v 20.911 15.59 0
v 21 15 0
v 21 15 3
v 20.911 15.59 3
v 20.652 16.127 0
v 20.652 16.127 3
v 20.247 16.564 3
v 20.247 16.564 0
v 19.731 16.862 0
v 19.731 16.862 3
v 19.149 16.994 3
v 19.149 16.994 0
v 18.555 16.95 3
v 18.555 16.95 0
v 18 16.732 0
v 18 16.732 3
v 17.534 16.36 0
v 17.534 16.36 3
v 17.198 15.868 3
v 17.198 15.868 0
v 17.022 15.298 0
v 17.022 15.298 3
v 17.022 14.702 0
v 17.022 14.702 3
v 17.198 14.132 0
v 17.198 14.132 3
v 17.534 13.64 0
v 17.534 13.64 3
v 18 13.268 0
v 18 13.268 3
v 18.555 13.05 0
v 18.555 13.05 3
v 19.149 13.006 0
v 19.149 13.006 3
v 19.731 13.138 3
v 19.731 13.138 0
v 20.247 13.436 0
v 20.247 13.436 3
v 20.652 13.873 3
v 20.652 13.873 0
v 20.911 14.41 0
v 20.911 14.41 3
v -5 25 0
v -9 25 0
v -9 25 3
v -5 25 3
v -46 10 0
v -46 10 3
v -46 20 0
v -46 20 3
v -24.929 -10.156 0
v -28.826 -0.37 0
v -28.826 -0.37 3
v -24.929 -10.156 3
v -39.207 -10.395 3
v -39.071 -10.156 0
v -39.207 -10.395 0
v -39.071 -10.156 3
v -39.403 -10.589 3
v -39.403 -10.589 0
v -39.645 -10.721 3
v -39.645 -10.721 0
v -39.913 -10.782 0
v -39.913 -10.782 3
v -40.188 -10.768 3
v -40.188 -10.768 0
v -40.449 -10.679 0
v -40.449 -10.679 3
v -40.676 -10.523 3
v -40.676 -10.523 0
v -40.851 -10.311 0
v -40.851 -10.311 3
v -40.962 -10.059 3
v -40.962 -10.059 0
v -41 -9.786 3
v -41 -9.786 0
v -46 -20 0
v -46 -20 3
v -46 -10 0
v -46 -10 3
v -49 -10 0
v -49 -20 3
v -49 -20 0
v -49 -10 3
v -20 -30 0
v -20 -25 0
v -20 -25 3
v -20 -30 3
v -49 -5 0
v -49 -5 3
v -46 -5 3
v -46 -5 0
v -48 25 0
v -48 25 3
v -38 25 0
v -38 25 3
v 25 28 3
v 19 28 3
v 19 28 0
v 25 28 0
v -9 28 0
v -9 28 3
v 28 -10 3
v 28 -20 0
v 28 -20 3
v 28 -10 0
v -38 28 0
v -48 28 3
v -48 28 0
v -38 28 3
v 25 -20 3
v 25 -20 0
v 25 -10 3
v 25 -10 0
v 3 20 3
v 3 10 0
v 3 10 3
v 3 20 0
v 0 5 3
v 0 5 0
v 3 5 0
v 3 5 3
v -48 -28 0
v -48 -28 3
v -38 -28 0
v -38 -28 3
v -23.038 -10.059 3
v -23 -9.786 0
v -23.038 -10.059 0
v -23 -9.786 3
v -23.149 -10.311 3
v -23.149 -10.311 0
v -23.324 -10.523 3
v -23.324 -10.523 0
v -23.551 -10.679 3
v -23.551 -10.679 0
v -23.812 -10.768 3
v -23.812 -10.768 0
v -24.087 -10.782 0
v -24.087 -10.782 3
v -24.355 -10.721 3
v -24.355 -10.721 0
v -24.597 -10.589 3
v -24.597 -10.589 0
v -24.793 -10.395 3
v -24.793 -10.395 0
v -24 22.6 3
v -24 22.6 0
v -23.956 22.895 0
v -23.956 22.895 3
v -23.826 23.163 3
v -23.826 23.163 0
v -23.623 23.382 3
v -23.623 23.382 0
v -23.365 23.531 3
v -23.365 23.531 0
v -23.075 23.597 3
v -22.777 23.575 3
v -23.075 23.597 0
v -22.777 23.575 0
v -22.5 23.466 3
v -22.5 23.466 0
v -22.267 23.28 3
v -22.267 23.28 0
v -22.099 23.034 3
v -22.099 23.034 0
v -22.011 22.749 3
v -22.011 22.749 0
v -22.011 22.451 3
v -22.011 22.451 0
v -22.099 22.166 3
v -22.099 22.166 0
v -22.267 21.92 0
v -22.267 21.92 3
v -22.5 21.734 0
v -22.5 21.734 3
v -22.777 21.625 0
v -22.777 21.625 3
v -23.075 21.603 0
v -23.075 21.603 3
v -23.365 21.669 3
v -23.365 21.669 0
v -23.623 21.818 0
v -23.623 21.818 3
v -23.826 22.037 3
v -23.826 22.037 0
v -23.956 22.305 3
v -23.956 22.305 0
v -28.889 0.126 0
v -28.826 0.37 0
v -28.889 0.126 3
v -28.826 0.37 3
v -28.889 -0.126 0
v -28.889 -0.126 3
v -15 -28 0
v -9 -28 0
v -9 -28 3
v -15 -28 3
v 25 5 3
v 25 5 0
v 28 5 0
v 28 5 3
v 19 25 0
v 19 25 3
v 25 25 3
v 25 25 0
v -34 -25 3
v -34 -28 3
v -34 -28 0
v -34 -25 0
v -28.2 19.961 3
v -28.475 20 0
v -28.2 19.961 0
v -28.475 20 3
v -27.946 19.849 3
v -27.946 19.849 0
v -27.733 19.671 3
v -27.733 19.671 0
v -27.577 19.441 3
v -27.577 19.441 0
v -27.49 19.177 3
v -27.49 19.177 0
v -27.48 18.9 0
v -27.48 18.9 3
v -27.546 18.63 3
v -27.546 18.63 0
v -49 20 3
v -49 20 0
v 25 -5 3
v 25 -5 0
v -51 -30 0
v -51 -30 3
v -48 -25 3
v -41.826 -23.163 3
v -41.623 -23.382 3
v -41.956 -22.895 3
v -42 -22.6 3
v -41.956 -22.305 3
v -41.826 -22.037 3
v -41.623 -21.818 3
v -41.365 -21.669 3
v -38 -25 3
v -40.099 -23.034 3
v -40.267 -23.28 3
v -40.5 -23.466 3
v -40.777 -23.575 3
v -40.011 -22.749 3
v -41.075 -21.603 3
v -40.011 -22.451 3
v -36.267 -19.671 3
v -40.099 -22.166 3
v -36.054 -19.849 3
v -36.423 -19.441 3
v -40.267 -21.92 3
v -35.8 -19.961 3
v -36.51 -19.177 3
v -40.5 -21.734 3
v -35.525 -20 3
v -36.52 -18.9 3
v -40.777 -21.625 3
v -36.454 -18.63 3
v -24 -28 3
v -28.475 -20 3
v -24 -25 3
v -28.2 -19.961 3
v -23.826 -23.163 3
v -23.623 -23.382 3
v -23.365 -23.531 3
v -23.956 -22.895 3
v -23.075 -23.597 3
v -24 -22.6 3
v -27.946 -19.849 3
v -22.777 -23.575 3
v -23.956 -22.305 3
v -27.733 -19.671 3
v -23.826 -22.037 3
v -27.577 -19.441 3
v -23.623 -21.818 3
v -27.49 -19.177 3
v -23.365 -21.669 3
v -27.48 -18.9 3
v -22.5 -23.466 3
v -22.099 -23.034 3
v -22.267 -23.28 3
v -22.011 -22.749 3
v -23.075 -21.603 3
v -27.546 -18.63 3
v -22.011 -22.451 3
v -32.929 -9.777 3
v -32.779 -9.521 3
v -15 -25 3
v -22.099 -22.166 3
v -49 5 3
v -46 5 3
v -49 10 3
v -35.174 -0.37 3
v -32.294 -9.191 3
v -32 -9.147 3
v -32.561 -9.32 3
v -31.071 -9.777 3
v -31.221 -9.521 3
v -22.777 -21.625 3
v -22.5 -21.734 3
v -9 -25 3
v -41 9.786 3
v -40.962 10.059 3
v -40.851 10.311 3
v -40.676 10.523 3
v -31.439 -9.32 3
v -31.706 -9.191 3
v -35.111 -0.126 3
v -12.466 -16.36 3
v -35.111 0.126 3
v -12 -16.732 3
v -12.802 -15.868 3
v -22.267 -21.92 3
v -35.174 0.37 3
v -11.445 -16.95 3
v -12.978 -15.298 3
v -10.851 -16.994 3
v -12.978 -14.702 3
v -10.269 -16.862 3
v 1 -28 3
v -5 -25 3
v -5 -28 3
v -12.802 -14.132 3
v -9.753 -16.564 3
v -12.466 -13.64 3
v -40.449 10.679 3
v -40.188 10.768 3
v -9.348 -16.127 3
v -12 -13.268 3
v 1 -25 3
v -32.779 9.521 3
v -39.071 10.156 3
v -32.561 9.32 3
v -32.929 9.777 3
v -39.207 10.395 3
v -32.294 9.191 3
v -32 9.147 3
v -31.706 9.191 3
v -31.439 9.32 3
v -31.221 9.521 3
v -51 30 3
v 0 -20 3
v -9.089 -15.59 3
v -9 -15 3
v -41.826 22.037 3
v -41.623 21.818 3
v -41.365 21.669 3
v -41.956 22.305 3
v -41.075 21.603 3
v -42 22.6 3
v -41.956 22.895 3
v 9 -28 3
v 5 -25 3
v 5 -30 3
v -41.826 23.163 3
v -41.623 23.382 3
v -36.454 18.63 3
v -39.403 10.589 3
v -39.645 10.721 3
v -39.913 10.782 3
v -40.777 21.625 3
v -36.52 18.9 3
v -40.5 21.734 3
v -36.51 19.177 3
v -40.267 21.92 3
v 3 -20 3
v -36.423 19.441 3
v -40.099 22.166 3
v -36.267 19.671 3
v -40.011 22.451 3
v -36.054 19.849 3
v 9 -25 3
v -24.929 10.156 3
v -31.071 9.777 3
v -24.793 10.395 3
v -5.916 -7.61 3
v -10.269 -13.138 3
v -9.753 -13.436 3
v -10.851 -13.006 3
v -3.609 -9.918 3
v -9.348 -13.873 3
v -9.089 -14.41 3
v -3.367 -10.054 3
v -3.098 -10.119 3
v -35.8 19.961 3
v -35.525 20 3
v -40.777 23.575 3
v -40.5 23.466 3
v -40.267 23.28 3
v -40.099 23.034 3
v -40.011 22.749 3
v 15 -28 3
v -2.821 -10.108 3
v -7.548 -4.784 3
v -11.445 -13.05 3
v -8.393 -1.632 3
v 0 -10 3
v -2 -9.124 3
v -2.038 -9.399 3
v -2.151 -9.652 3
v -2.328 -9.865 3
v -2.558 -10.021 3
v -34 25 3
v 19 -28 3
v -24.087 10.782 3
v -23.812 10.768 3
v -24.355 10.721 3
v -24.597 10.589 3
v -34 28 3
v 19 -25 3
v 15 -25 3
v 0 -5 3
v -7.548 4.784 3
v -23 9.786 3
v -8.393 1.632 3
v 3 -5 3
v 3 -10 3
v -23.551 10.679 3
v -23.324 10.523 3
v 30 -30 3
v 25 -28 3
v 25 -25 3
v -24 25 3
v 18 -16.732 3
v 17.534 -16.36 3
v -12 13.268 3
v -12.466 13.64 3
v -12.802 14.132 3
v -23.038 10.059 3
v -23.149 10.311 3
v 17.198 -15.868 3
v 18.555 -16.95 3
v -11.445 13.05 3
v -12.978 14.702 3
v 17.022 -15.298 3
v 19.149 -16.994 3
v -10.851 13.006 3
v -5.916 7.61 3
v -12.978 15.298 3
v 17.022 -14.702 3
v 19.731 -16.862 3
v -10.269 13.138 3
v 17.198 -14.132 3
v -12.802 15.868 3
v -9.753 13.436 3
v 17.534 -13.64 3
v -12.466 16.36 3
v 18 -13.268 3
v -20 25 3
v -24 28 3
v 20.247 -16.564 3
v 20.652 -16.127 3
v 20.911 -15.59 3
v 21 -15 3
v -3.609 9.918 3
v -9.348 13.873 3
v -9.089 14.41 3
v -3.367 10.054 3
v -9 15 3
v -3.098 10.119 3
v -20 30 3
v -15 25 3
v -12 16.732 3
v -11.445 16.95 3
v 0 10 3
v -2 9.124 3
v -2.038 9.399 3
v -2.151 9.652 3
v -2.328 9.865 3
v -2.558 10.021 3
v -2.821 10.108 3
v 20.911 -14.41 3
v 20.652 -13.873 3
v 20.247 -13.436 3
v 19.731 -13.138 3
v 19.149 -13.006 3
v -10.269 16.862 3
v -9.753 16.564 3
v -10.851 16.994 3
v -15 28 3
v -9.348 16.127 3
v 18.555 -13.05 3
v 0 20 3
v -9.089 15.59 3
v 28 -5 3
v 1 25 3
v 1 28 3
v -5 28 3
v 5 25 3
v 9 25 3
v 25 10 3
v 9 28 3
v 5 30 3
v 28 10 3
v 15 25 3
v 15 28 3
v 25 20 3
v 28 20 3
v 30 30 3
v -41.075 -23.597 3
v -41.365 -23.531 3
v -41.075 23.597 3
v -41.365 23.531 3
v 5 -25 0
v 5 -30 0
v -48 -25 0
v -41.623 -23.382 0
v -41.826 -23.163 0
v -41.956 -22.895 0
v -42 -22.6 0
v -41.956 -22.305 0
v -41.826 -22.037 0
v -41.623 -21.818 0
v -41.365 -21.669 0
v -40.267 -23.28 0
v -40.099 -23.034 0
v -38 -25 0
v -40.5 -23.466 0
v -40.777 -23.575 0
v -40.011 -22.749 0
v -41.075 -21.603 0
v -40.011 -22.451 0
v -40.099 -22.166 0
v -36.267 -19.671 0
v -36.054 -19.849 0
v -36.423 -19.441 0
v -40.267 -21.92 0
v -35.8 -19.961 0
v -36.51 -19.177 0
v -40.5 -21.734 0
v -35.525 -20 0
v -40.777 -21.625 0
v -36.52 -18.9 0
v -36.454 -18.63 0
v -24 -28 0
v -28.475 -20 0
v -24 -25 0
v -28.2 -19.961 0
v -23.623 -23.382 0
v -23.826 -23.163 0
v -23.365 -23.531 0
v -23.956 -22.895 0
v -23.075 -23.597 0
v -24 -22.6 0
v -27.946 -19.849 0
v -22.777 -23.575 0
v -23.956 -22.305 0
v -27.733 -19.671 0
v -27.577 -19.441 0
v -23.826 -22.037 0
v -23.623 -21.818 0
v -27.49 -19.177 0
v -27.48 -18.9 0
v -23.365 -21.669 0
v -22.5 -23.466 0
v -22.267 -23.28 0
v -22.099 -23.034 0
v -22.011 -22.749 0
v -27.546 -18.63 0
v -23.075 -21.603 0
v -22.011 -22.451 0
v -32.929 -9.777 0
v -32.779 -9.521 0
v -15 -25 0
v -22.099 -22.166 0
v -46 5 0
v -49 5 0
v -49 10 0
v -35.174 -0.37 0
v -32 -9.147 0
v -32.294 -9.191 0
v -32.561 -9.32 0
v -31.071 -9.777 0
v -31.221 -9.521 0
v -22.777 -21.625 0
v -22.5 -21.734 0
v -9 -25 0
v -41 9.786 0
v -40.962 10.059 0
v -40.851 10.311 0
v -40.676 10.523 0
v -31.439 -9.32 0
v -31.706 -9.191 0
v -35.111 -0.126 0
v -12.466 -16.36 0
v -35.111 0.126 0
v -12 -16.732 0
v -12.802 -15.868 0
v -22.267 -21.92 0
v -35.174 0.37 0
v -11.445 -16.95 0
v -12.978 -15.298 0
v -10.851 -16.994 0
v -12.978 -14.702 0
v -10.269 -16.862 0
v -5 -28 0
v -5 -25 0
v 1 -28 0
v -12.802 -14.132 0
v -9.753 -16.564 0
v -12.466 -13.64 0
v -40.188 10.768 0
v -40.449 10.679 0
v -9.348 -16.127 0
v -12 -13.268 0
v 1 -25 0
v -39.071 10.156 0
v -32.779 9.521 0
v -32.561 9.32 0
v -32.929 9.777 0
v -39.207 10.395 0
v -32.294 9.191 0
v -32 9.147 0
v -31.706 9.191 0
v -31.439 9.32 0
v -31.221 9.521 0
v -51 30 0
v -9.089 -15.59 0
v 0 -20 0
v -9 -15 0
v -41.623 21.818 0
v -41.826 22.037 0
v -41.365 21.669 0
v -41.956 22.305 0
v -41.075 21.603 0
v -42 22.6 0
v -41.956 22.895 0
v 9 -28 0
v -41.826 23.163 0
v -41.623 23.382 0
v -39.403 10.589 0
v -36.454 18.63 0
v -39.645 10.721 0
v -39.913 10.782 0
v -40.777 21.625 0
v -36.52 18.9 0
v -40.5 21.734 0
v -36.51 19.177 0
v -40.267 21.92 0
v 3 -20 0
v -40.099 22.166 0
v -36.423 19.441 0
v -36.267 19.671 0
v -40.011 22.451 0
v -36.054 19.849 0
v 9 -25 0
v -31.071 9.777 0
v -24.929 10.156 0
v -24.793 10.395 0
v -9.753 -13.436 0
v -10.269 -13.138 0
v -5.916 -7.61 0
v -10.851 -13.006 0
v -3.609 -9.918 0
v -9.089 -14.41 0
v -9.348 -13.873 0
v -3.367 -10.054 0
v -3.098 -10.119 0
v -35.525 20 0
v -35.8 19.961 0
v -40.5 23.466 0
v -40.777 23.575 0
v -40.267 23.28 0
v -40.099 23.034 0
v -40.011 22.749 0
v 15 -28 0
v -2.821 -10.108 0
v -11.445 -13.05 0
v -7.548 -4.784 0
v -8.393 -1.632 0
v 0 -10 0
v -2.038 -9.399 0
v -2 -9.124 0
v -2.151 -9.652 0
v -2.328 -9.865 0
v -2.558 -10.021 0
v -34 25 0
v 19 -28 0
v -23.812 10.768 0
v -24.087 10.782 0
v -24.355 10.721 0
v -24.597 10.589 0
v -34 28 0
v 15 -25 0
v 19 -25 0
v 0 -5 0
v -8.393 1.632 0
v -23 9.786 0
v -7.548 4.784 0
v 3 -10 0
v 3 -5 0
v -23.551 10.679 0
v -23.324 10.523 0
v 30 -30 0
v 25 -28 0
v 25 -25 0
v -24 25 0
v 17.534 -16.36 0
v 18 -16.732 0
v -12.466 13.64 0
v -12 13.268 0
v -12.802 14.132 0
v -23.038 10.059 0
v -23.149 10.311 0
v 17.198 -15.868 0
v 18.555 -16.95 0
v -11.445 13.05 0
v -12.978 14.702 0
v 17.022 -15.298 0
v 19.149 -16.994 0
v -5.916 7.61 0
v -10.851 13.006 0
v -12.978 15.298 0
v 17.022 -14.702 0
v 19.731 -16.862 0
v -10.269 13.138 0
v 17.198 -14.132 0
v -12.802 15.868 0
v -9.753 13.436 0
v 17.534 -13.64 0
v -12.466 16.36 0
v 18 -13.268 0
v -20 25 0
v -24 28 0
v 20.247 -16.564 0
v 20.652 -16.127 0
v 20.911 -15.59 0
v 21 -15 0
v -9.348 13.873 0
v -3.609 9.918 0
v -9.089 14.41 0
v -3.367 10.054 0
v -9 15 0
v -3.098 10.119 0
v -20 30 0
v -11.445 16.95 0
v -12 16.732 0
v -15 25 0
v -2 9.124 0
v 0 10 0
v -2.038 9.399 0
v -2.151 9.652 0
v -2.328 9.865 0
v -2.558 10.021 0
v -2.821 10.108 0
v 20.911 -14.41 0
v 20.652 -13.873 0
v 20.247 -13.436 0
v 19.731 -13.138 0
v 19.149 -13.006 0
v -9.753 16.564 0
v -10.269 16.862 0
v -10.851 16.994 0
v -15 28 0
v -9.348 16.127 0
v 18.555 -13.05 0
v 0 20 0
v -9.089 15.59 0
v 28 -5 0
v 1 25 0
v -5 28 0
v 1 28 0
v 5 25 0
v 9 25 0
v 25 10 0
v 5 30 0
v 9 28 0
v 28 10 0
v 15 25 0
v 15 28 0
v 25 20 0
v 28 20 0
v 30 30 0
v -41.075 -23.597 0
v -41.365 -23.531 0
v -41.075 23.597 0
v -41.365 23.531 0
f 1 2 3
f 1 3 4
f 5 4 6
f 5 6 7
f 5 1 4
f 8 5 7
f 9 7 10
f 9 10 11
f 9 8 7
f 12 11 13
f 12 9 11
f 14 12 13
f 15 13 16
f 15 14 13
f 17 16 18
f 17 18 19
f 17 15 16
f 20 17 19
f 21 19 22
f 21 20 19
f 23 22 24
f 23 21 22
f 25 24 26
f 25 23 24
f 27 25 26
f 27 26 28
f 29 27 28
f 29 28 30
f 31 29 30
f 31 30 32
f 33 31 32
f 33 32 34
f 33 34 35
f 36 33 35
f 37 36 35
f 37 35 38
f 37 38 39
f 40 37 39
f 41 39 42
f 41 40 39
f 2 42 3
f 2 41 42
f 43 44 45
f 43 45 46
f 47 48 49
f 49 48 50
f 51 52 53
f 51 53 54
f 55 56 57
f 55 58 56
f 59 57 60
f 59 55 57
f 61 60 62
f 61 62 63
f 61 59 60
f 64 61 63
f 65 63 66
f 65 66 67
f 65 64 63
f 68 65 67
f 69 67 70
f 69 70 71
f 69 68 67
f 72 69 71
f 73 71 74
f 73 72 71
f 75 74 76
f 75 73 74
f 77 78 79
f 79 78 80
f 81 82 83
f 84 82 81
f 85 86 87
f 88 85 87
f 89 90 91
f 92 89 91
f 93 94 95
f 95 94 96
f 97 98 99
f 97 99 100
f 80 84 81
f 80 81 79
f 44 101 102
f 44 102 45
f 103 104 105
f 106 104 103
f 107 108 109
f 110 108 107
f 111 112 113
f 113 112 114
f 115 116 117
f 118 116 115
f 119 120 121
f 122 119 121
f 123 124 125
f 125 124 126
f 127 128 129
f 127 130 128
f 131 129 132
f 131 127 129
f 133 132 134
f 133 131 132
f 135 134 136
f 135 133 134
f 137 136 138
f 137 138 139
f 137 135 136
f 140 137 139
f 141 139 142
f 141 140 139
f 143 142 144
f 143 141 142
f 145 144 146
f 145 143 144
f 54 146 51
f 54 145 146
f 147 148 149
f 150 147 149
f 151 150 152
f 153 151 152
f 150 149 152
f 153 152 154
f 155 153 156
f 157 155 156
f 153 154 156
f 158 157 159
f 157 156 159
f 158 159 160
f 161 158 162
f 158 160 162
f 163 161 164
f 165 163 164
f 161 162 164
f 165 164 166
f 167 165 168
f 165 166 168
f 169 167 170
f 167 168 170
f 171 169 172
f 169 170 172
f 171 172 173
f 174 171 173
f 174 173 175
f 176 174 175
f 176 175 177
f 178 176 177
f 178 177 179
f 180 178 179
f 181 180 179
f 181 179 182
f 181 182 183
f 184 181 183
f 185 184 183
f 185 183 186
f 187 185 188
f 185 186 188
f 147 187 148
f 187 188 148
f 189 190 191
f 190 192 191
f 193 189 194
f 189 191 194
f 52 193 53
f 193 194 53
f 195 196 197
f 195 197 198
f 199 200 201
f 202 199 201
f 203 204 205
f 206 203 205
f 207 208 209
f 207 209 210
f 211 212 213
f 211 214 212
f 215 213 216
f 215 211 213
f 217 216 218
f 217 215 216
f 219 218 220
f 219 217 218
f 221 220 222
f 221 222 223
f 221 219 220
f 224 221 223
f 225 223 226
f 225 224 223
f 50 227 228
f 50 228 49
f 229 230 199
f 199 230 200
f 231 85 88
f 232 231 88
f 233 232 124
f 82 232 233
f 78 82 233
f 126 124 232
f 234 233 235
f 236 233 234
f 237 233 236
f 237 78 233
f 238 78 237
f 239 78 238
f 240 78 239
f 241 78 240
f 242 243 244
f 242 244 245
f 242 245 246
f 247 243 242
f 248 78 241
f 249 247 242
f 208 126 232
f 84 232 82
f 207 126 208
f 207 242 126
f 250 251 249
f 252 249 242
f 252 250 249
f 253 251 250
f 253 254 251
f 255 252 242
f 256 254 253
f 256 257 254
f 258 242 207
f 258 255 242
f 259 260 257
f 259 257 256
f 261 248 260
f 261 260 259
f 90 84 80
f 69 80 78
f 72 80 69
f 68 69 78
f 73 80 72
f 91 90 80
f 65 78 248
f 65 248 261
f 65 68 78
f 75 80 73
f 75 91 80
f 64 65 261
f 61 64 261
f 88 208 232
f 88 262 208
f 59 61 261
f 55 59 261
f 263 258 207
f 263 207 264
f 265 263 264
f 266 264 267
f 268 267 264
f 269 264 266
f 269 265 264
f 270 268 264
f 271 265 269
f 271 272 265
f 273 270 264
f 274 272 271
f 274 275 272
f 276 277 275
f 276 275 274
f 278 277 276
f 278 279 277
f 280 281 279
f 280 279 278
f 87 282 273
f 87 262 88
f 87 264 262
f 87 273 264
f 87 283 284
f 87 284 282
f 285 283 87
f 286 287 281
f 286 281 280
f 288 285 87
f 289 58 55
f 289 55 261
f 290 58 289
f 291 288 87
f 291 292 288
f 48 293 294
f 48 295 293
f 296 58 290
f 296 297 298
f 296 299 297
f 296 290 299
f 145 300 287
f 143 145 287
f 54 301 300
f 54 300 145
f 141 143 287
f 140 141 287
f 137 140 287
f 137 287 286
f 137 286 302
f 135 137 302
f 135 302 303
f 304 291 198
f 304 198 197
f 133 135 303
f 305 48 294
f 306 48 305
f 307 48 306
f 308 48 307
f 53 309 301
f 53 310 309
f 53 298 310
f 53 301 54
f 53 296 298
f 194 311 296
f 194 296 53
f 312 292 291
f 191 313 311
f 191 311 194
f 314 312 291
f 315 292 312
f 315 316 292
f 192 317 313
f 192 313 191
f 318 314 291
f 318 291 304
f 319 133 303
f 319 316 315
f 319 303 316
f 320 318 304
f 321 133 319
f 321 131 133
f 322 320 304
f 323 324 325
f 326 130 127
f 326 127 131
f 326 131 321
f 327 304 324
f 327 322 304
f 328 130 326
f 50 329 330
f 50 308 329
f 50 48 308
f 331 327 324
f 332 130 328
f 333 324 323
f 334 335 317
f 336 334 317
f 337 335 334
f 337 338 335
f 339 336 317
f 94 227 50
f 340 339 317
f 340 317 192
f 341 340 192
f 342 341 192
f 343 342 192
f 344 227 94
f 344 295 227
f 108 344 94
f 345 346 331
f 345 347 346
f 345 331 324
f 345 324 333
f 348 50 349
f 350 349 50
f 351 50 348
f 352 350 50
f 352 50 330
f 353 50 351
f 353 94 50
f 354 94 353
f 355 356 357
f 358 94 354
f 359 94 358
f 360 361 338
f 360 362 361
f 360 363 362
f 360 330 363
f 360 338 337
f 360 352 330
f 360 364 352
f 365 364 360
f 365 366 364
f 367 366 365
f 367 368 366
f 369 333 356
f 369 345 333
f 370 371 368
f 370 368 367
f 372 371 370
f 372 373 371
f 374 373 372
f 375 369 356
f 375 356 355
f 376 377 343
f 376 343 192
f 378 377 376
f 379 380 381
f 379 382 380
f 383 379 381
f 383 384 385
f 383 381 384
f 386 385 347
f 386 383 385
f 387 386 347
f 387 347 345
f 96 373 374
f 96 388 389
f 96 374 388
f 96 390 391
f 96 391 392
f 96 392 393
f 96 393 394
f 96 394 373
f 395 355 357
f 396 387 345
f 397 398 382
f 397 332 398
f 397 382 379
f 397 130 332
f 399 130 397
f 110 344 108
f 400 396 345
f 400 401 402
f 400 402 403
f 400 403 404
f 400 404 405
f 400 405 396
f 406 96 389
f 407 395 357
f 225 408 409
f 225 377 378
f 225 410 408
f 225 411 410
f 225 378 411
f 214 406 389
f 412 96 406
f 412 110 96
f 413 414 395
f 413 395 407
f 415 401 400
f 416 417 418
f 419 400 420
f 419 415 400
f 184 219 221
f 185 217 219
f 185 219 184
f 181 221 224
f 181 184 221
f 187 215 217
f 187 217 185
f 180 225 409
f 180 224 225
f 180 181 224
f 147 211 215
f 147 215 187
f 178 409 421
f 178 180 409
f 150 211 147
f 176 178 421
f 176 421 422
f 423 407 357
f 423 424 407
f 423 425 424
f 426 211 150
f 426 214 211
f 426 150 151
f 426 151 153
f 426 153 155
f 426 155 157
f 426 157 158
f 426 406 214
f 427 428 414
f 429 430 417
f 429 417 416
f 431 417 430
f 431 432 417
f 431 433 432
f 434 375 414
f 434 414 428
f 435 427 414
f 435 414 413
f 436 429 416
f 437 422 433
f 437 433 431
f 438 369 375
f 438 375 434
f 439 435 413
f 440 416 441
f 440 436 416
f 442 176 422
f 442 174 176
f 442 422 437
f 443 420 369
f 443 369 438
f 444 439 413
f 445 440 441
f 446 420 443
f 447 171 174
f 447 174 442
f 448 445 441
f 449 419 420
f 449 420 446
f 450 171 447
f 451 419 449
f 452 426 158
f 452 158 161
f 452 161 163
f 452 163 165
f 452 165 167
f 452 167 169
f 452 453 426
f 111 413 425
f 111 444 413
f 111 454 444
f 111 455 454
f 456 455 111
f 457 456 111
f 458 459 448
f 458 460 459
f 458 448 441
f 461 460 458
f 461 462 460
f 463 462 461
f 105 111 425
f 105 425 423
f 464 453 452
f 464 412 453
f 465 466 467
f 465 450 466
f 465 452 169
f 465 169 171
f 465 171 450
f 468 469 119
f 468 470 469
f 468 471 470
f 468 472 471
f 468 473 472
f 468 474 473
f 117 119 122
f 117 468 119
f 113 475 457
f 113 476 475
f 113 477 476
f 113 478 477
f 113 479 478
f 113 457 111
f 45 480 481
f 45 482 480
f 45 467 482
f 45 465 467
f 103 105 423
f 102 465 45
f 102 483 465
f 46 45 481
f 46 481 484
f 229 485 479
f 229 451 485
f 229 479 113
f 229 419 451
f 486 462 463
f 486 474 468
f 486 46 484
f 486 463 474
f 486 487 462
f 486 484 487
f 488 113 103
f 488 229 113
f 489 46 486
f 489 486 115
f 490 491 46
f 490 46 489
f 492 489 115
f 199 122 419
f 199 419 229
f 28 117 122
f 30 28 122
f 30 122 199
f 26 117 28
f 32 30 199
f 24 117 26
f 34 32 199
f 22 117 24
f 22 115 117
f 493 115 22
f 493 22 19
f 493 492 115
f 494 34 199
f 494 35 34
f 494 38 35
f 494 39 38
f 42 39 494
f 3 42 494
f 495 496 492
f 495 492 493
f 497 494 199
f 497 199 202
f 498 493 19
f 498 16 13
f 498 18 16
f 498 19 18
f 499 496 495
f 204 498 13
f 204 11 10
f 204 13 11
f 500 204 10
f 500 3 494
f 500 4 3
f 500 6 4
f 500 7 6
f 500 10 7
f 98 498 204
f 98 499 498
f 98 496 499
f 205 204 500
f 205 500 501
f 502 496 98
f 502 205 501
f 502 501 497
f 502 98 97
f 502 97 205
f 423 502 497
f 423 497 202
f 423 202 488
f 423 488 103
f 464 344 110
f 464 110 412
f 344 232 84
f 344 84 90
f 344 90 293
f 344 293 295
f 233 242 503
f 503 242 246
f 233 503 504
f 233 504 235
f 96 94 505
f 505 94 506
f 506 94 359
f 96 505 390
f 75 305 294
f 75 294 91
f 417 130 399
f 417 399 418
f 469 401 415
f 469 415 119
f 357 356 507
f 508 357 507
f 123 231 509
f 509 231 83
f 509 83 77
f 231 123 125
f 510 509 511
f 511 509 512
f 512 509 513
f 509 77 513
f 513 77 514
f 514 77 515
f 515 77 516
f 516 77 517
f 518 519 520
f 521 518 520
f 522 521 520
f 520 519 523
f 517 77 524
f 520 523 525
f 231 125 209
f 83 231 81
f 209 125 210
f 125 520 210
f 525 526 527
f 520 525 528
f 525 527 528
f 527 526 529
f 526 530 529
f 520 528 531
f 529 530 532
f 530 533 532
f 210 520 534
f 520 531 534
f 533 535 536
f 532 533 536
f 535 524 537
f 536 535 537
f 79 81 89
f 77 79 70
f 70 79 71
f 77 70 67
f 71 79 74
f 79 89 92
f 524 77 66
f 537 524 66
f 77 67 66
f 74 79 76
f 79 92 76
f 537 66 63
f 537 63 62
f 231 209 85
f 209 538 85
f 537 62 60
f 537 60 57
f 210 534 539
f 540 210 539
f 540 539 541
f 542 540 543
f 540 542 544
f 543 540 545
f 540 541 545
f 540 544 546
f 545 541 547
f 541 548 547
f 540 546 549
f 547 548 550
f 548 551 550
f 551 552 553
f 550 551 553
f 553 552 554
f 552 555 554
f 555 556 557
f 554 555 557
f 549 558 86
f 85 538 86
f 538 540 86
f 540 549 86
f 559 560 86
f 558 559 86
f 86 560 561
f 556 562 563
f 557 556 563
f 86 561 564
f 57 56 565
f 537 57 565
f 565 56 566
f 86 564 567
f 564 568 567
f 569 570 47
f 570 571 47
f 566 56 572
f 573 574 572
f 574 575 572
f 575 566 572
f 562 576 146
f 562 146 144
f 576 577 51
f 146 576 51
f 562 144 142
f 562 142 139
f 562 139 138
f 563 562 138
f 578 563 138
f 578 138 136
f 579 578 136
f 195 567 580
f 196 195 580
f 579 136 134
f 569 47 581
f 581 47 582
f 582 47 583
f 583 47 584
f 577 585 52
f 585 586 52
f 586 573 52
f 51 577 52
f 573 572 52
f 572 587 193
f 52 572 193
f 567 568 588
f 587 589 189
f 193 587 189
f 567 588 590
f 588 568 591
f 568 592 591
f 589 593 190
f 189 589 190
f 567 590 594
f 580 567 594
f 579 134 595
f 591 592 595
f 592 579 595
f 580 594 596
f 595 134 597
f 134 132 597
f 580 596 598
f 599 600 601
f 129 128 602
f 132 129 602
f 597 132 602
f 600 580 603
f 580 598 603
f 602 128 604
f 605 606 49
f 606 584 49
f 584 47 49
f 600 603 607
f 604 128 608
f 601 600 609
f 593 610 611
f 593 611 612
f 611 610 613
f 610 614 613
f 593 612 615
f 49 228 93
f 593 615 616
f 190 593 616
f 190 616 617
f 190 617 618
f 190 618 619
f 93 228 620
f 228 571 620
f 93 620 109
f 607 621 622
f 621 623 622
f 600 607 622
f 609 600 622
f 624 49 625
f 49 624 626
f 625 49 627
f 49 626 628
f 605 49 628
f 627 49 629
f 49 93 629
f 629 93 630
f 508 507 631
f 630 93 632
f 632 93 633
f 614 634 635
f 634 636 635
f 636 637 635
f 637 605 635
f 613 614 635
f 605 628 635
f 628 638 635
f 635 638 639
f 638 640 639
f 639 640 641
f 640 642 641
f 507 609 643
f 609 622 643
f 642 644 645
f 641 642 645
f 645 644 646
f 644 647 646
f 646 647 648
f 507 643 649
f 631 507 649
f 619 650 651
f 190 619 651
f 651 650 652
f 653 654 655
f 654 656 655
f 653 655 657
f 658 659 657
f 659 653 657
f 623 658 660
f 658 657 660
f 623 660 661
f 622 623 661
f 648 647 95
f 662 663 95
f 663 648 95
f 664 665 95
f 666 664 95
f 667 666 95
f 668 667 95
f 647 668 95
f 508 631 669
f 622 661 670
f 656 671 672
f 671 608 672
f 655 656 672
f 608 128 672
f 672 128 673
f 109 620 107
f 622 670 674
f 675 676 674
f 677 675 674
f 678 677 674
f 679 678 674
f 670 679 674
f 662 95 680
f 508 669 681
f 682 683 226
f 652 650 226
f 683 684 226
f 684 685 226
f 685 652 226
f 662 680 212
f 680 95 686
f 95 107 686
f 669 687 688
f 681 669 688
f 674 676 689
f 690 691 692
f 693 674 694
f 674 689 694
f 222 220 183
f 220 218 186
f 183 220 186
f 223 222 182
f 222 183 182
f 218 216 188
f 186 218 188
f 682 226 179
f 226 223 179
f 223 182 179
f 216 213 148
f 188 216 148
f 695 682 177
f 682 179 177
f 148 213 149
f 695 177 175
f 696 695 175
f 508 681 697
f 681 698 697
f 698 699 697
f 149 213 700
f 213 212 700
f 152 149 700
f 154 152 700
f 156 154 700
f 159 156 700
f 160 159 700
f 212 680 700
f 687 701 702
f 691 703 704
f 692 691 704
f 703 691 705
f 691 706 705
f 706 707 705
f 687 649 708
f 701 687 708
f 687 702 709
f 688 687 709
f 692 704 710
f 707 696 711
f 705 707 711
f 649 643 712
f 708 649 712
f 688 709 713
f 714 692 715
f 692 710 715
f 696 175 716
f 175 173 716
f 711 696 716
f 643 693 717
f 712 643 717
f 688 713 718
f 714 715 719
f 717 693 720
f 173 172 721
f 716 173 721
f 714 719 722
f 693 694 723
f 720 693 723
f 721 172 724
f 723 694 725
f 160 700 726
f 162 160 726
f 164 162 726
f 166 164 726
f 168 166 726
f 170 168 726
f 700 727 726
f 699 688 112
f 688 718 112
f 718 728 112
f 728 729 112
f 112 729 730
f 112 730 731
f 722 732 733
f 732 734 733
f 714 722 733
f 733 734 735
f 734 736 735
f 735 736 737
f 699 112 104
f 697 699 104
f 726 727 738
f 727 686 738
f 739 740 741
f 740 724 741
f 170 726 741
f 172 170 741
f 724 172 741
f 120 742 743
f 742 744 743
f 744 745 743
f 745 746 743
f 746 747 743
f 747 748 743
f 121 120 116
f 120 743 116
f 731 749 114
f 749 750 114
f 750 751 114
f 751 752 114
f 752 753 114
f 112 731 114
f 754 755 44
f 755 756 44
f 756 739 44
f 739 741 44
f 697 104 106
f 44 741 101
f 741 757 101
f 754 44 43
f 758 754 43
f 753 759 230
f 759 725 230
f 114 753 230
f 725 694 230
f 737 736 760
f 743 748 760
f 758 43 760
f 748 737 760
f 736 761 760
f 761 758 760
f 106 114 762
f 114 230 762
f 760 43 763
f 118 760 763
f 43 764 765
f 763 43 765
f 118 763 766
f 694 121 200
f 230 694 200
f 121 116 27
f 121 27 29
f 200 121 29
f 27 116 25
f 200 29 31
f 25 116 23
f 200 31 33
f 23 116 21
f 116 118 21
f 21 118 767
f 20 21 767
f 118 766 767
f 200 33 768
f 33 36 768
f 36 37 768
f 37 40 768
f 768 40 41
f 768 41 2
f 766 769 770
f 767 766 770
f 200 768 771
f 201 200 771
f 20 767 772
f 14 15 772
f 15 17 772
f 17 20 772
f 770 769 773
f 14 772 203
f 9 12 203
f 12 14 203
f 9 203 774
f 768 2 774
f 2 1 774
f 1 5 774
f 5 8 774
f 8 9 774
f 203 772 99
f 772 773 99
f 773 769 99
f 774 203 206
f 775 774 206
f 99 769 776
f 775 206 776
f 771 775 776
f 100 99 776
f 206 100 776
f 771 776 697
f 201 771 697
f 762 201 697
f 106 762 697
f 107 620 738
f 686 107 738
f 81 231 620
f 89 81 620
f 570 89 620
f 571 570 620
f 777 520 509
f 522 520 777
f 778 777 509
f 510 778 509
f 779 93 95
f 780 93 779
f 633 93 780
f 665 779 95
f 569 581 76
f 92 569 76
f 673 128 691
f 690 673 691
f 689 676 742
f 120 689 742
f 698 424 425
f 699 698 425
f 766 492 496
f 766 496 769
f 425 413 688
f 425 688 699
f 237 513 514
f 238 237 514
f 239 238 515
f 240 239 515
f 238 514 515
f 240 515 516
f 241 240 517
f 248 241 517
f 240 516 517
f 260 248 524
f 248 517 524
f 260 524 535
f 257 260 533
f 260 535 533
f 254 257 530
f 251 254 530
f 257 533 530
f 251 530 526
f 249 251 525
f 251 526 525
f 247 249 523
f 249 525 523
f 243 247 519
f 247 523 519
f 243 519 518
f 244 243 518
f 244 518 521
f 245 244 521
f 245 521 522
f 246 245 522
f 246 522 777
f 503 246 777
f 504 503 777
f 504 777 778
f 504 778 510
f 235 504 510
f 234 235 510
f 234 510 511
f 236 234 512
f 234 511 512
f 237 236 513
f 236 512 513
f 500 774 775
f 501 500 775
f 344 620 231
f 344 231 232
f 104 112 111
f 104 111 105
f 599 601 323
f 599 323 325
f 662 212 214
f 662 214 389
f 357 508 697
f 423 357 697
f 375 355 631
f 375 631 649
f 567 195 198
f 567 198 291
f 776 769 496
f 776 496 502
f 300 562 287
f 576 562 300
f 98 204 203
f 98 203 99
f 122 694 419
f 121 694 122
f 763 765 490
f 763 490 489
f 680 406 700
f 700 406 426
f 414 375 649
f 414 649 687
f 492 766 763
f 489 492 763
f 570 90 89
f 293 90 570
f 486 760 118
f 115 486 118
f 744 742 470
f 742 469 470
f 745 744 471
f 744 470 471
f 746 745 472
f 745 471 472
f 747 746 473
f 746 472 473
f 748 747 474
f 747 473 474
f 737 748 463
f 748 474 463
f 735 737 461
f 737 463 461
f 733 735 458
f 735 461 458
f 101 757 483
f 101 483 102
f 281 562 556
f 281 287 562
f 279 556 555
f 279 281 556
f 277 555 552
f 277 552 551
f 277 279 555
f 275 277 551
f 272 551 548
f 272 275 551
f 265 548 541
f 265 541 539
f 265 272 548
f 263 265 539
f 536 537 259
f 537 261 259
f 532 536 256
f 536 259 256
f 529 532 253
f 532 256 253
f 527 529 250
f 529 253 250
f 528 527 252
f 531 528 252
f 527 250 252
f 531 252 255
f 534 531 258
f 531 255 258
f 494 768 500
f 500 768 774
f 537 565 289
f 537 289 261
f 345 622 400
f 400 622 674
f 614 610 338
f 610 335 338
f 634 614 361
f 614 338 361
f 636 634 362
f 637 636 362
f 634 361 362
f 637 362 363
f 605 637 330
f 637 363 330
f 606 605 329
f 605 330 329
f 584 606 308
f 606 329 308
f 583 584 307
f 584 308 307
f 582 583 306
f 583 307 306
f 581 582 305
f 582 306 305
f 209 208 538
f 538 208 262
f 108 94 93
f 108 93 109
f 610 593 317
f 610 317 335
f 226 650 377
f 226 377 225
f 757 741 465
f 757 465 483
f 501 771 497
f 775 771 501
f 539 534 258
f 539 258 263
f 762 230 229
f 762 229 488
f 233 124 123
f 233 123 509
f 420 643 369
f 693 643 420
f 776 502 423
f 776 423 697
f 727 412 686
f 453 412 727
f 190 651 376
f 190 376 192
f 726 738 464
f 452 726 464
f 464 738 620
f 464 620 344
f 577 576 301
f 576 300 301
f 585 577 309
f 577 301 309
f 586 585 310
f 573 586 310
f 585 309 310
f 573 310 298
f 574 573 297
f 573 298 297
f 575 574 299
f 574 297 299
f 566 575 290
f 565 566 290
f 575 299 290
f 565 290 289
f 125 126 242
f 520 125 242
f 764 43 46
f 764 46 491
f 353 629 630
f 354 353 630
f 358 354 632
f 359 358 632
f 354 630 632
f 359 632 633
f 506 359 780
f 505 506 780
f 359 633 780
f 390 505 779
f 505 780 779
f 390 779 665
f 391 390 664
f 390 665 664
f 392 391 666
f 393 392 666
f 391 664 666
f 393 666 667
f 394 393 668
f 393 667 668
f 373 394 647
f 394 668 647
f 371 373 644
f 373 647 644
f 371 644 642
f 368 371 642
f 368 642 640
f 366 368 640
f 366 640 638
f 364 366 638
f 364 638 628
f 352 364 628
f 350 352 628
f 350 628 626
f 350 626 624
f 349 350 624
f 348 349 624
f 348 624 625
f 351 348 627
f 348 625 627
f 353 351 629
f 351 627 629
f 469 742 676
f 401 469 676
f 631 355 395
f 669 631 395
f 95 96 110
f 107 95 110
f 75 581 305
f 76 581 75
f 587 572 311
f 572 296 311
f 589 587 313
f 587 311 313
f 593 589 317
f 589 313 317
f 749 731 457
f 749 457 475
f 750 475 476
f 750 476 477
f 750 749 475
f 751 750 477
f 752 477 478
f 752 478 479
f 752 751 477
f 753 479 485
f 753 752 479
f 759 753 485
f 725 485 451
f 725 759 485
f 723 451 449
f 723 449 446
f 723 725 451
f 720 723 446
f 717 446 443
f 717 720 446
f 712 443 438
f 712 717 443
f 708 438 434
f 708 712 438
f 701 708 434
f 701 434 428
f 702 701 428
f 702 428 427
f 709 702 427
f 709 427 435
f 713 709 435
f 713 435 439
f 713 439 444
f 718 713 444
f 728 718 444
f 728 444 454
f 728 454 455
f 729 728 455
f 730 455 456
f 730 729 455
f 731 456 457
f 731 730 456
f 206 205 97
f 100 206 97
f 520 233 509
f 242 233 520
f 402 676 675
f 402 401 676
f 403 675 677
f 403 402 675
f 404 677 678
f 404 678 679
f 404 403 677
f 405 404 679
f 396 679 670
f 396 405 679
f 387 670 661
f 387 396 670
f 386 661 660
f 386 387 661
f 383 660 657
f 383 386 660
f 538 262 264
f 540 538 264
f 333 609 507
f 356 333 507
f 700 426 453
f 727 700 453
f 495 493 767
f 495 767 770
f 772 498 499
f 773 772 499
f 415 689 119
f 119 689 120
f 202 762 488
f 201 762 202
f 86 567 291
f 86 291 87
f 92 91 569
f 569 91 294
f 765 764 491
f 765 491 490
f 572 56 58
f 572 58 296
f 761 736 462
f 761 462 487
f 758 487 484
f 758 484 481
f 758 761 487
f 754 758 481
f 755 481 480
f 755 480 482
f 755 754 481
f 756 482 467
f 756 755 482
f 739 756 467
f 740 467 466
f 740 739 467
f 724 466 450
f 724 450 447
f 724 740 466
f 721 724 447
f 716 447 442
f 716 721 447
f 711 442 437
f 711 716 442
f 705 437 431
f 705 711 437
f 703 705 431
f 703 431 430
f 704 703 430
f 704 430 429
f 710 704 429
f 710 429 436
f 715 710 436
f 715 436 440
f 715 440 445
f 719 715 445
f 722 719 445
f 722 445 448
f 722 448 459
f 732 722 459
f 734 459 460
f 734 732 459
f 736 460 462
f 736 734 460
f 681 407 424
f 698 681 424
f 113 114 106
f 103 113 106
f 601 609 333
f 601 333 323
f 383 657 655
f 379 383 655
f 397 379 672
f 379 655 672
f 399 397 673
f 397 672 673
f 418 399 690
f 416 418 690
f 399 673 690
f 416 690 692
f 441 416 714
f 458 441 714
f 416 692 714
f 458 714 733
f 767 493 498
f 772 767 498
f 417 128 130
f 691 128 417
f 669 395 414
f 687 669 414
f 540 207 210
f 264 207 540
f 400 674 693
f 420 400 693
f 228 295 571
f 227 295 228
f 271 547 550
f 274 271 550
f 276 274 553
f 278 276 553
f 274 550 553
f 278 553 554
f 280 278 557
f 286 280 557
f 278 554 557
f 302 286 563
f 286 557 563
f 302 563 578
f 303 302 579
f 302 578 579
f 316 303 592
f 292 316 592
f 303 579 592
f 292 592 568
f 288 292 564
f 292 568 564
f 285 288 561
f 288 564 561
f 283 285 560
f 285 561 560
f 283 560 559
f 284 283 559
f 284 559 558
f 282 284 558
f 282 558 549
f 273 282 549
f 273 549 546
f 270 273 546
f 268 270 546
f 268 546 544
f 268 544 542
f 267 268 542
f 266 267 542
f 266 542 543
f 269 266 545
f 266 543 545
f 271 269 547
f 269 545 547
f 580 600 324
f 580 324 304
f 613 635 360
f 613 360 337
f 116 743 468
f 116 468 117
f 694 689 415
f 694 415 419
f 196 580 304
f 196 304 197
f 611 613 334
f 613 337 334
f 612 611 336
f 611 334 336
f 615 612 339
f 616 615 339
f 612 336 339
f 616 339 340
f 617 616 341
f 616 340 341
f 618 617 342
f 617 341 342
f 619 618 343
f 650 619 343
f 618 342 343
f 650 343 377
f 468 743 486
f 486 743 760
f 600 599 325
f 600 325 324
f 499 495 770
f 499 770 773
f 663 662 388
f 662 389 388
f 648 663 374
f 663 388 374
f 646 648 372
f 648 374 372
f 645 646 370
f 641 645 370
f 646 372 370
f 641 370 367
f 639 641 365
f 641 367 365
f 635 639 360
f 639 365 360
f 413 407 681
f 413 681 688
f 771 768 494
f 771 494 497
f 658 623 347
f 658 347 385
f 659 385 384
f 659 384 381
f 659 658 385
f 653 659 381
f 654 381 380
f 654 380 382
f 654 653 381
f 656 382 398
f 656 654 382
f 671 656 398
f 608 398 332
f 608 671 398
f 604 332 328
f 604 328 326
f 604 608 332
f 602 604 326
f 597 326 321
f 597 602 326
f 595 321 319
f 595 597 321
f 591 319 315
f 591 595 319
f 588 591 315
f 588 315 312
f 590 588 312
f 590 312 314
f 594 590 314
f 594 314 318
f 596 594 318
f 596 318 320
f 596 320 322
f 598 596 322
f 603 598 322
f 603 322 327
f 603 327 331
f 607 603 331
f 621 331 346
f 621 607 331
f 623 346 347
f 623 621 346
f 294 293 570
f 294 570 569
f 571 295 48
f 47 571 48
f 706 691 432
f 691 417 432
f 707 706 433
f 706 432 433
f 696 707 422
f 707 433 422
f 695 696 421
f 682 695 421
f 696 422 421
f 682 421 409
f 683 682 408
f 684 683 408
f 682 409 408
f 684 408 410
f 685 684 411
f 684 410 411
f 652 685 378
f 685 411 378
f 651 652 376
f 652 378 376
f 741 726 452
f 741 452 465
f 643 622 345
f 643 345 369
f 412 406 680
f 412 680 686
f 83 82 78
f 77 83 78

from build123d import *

# Parameters (mm, degrees)
SKETCH_1_R          = 2
SKETCH_1_W          = 3
SKETCH_1_H          = 10
EXTRUDE_1_DEPTH     = 3
SKETCH_2_W          = 3
SKETCH_2_H          = 60
EXTRUDE_2_DEPTH     = 31
SKETCH_3_W          = 25
SKETCH_3_H          = 3
EXTRUDE_3_DEPTH     = 5
SKETCH_4_W          = 10
SKETCH_4_H          = 3
SKETCH_4_W_2        = 6
SKETCH_4_W_3        = 3
SKETCH_4_H_2        = 10
CUT_EXTRUDE_1_DEPTH = 3
SKETCH_5_R          = 1
CUT_EXTRUDE_2_DEPTH = 3
FILLET_1_R          = 1


with BuildPart() as part:
    # 草图1 → 凸台-拉伸1 (new body)
    with BuildSketch(Plane.XY):
        Polygon((-5, 25), (-5, 28), (1, 28), (1, 25), (5, 25), (10, 25), (20, 25), (25, 25), (30, 25), (30, -25), (25, -25), (20, -25), (10, -25), (5, -25), (1, -25), (1, -28), (-5, -28), (-5, -25), (-9, -25), (-9, -28), (-15, -28), (-15, -25), (-20, -25), (-20, 25), (-15, 25), (-15, 28), (-9, 28), (-9, 25), align=None)
        with Locations((-11, 15)):
            Circle(SKETCH_1_R, mode=Mode.SUBTRACT)
        with Locations((-11, -15)):
            Circle(SKETCH_1_R, mode=Mode.SUBTRACT)
        with Locations((19, -15)):
            Circle(SKETCH_1_R, mode=Mode.SUBTRACT)
        with Locations((19, 15)):
            Circle(SKETCH_1_R, mode=Mode.SUBTRACT)
        with Locations((26.5, 15)):
            Rectangle(SKETCH_1_W, SKETCH_1_H, mode=Mode.SUBTRACT)
        with Locations((26.5, 0)):
            Rectangle(SKETCH_1_W, SKETCH_1_H, mode=Mode.SUBTRACT)
        with Locations((26.5, -15)):
            Rectangle(SKETCH_1_W, SKETCH_1_H, mode=Mode.SUBTRACT)
        with Locations((1.5, 0)):
            Rectangle(SKETCH_1_W, SKETCH_1_H, mode=Mode.SUBTRACT)
        with Locations((1.5, -15)):
            Rectangle(SKETCH_1_W, SKETCH_1_H, mode=Mode.SUBTRACT)
        with Locations((1.5, 15)):
            Rectangle(SKETCH_1_W, SKETCH_1_H, mode=Mode.SUBTRACT)
    extrude(amount=EXTRUDE_1_DEPTH)

    # 草图2 → 凸台-拉伸2 (add)
    with BuildSketch(Plane.ZY.offset(20)):
        with Locations((1.5, 0)):
            Rectangle(SKETCH_2_W, SKETCH_2_H)
    extrude(amount=EXTRUDE_2_DEPTH)

    # 草图3 → 凸台-拉伸3 (add)
    with BuildSketch(Plane(origin=(0, 25, 0), x_dir=(1, 0, 0), z_dir=(0, 1, 0))):
        with Locations((17.5, -1.5)):
            Rectangle(SKETCH_3_W, SKETCH_3_H)
    extrude_3 = extrude(amount=EXTRUDE_3_DEPTH)

    # 镜向1: 凸台-拉伸3 across plane
    add(extrude_3.mirror(Plane.ZX))

    # 草图4 → 切除-拉伸1 (cut)
    with BuildSketch(Plane.XY.offset(3)):
        with Locations((-43, 26.5)):
            Rectangle(SKETCH_4_W, SKETCH_4_H)
        with Locations((-29, 26.5)):
            Rectangle(SKETCH_4_W, SKETCH_4_H)
        with Locations((12, 26.5)):
            Rectangle(SKETCH_4_W_2, SKETCH_4_H)
        with Locations((22, 26.5)):
            Rectangle(SKETCH_4_W_2, SKETCH_4_H)
        with Locations((22, -26.5)):
            Rectangle(SKETCH_4_W_2, SKETCH_4_H)
        with Locations((12, -26.5)):
            Rectangle(SKETCH_4_W_2, SKETCH_4_H)
        with Locations((-29, -26.5)):
            Rectangle(SKETCH_4_W, SKETCH_4_H)
        with Locations((-43, -26.5)):
            Rectangle(SKETCH_4_W, SKETCH_4_H)
        with Locations((-47.5, 0)):
            Rectangle(SKETCH_4_W_3, SKETCH_4_H_2)
        with Locations((-47.5, 15)):
            Rectangle(SKETCH_4_W_3, SKETCH_4_H_2)
        with Locations((-47.5, -15)):
            Rectangle(SKETCH_4_W_3, SKETCH_4_H_2)
    extrude(amount=-CUT_EXTRUDE_1_DEPTH, mode=Mode.SUBTRACT)

    # 草图5 → 切除-拉伸2 (cut)
    with BuildSketch(Plane(origin=(0, 0, 0), x_dir=(-1, 0, 0), z_dir=(0, 0, -1))):
        with Locations((23, 22.6)):
            Circle(SKETCH_5_R)
        with Locations((41, 22.6)):
            Circle(SKETCH_5_R)
        with Locations((41, -22.6)):
            Circle(SKETCH_5_R)
        with Locations((23, -22.6)):
            Circle(SKETCH_5_R)
        with BuildLine():
            Line((2, 7.351919832), (2, -7.055869369))
            Line((2, -7.055869369), (2, -10.9658561))
            ThreePointArc((2, -10.9658561), (8.5, 0), (2, 10.9658561))
            Line((2, 10.9658561), (2, 7.351919832))
        make_face()
        Polygon((23, -15), (23, 15), (28.973451327, 0), align=None)
        Polygon((27, -20), (32, -7.444444444), (37, -20), align=None)
        Polygon((41, -15), (35.026548673, 0), (41, 15), align=None)
        Polygon((27, 20), (37, 20), (32, 7.444444444), align=None)
    extrude(amount=-CUT_EXTRUDE_2_DEPTH, mode=Mode.SUBTRACT)

    # 圆角1
    fillet_1_edges = [part.edges().sort_by_distance(p)[0] for p in [
        (-2, 10.9658561, 1.5),
        (-2, -10.9658561, 1.5),
        (-23, 15, 1.5),
        (-28.973451327, 0, 1.5),
        (-23, -15, 1.5),
        (-37, 20, 1.5),
        (-32, 7.444444444, 1.5),
        (-27, 20, 1.5),
        (-41, 15, 1.5),
        (-41, -15, 1.5),
        (-35.026548673, 0, 1.5),
        (-37, -20, 1.5),
        (-27, -20, 1.5),
        (-32, -7.444444444, 1.5),
    ]]
    fillet(fillet_1_edges, radius=FILLET_1_R)


solid = part.part
